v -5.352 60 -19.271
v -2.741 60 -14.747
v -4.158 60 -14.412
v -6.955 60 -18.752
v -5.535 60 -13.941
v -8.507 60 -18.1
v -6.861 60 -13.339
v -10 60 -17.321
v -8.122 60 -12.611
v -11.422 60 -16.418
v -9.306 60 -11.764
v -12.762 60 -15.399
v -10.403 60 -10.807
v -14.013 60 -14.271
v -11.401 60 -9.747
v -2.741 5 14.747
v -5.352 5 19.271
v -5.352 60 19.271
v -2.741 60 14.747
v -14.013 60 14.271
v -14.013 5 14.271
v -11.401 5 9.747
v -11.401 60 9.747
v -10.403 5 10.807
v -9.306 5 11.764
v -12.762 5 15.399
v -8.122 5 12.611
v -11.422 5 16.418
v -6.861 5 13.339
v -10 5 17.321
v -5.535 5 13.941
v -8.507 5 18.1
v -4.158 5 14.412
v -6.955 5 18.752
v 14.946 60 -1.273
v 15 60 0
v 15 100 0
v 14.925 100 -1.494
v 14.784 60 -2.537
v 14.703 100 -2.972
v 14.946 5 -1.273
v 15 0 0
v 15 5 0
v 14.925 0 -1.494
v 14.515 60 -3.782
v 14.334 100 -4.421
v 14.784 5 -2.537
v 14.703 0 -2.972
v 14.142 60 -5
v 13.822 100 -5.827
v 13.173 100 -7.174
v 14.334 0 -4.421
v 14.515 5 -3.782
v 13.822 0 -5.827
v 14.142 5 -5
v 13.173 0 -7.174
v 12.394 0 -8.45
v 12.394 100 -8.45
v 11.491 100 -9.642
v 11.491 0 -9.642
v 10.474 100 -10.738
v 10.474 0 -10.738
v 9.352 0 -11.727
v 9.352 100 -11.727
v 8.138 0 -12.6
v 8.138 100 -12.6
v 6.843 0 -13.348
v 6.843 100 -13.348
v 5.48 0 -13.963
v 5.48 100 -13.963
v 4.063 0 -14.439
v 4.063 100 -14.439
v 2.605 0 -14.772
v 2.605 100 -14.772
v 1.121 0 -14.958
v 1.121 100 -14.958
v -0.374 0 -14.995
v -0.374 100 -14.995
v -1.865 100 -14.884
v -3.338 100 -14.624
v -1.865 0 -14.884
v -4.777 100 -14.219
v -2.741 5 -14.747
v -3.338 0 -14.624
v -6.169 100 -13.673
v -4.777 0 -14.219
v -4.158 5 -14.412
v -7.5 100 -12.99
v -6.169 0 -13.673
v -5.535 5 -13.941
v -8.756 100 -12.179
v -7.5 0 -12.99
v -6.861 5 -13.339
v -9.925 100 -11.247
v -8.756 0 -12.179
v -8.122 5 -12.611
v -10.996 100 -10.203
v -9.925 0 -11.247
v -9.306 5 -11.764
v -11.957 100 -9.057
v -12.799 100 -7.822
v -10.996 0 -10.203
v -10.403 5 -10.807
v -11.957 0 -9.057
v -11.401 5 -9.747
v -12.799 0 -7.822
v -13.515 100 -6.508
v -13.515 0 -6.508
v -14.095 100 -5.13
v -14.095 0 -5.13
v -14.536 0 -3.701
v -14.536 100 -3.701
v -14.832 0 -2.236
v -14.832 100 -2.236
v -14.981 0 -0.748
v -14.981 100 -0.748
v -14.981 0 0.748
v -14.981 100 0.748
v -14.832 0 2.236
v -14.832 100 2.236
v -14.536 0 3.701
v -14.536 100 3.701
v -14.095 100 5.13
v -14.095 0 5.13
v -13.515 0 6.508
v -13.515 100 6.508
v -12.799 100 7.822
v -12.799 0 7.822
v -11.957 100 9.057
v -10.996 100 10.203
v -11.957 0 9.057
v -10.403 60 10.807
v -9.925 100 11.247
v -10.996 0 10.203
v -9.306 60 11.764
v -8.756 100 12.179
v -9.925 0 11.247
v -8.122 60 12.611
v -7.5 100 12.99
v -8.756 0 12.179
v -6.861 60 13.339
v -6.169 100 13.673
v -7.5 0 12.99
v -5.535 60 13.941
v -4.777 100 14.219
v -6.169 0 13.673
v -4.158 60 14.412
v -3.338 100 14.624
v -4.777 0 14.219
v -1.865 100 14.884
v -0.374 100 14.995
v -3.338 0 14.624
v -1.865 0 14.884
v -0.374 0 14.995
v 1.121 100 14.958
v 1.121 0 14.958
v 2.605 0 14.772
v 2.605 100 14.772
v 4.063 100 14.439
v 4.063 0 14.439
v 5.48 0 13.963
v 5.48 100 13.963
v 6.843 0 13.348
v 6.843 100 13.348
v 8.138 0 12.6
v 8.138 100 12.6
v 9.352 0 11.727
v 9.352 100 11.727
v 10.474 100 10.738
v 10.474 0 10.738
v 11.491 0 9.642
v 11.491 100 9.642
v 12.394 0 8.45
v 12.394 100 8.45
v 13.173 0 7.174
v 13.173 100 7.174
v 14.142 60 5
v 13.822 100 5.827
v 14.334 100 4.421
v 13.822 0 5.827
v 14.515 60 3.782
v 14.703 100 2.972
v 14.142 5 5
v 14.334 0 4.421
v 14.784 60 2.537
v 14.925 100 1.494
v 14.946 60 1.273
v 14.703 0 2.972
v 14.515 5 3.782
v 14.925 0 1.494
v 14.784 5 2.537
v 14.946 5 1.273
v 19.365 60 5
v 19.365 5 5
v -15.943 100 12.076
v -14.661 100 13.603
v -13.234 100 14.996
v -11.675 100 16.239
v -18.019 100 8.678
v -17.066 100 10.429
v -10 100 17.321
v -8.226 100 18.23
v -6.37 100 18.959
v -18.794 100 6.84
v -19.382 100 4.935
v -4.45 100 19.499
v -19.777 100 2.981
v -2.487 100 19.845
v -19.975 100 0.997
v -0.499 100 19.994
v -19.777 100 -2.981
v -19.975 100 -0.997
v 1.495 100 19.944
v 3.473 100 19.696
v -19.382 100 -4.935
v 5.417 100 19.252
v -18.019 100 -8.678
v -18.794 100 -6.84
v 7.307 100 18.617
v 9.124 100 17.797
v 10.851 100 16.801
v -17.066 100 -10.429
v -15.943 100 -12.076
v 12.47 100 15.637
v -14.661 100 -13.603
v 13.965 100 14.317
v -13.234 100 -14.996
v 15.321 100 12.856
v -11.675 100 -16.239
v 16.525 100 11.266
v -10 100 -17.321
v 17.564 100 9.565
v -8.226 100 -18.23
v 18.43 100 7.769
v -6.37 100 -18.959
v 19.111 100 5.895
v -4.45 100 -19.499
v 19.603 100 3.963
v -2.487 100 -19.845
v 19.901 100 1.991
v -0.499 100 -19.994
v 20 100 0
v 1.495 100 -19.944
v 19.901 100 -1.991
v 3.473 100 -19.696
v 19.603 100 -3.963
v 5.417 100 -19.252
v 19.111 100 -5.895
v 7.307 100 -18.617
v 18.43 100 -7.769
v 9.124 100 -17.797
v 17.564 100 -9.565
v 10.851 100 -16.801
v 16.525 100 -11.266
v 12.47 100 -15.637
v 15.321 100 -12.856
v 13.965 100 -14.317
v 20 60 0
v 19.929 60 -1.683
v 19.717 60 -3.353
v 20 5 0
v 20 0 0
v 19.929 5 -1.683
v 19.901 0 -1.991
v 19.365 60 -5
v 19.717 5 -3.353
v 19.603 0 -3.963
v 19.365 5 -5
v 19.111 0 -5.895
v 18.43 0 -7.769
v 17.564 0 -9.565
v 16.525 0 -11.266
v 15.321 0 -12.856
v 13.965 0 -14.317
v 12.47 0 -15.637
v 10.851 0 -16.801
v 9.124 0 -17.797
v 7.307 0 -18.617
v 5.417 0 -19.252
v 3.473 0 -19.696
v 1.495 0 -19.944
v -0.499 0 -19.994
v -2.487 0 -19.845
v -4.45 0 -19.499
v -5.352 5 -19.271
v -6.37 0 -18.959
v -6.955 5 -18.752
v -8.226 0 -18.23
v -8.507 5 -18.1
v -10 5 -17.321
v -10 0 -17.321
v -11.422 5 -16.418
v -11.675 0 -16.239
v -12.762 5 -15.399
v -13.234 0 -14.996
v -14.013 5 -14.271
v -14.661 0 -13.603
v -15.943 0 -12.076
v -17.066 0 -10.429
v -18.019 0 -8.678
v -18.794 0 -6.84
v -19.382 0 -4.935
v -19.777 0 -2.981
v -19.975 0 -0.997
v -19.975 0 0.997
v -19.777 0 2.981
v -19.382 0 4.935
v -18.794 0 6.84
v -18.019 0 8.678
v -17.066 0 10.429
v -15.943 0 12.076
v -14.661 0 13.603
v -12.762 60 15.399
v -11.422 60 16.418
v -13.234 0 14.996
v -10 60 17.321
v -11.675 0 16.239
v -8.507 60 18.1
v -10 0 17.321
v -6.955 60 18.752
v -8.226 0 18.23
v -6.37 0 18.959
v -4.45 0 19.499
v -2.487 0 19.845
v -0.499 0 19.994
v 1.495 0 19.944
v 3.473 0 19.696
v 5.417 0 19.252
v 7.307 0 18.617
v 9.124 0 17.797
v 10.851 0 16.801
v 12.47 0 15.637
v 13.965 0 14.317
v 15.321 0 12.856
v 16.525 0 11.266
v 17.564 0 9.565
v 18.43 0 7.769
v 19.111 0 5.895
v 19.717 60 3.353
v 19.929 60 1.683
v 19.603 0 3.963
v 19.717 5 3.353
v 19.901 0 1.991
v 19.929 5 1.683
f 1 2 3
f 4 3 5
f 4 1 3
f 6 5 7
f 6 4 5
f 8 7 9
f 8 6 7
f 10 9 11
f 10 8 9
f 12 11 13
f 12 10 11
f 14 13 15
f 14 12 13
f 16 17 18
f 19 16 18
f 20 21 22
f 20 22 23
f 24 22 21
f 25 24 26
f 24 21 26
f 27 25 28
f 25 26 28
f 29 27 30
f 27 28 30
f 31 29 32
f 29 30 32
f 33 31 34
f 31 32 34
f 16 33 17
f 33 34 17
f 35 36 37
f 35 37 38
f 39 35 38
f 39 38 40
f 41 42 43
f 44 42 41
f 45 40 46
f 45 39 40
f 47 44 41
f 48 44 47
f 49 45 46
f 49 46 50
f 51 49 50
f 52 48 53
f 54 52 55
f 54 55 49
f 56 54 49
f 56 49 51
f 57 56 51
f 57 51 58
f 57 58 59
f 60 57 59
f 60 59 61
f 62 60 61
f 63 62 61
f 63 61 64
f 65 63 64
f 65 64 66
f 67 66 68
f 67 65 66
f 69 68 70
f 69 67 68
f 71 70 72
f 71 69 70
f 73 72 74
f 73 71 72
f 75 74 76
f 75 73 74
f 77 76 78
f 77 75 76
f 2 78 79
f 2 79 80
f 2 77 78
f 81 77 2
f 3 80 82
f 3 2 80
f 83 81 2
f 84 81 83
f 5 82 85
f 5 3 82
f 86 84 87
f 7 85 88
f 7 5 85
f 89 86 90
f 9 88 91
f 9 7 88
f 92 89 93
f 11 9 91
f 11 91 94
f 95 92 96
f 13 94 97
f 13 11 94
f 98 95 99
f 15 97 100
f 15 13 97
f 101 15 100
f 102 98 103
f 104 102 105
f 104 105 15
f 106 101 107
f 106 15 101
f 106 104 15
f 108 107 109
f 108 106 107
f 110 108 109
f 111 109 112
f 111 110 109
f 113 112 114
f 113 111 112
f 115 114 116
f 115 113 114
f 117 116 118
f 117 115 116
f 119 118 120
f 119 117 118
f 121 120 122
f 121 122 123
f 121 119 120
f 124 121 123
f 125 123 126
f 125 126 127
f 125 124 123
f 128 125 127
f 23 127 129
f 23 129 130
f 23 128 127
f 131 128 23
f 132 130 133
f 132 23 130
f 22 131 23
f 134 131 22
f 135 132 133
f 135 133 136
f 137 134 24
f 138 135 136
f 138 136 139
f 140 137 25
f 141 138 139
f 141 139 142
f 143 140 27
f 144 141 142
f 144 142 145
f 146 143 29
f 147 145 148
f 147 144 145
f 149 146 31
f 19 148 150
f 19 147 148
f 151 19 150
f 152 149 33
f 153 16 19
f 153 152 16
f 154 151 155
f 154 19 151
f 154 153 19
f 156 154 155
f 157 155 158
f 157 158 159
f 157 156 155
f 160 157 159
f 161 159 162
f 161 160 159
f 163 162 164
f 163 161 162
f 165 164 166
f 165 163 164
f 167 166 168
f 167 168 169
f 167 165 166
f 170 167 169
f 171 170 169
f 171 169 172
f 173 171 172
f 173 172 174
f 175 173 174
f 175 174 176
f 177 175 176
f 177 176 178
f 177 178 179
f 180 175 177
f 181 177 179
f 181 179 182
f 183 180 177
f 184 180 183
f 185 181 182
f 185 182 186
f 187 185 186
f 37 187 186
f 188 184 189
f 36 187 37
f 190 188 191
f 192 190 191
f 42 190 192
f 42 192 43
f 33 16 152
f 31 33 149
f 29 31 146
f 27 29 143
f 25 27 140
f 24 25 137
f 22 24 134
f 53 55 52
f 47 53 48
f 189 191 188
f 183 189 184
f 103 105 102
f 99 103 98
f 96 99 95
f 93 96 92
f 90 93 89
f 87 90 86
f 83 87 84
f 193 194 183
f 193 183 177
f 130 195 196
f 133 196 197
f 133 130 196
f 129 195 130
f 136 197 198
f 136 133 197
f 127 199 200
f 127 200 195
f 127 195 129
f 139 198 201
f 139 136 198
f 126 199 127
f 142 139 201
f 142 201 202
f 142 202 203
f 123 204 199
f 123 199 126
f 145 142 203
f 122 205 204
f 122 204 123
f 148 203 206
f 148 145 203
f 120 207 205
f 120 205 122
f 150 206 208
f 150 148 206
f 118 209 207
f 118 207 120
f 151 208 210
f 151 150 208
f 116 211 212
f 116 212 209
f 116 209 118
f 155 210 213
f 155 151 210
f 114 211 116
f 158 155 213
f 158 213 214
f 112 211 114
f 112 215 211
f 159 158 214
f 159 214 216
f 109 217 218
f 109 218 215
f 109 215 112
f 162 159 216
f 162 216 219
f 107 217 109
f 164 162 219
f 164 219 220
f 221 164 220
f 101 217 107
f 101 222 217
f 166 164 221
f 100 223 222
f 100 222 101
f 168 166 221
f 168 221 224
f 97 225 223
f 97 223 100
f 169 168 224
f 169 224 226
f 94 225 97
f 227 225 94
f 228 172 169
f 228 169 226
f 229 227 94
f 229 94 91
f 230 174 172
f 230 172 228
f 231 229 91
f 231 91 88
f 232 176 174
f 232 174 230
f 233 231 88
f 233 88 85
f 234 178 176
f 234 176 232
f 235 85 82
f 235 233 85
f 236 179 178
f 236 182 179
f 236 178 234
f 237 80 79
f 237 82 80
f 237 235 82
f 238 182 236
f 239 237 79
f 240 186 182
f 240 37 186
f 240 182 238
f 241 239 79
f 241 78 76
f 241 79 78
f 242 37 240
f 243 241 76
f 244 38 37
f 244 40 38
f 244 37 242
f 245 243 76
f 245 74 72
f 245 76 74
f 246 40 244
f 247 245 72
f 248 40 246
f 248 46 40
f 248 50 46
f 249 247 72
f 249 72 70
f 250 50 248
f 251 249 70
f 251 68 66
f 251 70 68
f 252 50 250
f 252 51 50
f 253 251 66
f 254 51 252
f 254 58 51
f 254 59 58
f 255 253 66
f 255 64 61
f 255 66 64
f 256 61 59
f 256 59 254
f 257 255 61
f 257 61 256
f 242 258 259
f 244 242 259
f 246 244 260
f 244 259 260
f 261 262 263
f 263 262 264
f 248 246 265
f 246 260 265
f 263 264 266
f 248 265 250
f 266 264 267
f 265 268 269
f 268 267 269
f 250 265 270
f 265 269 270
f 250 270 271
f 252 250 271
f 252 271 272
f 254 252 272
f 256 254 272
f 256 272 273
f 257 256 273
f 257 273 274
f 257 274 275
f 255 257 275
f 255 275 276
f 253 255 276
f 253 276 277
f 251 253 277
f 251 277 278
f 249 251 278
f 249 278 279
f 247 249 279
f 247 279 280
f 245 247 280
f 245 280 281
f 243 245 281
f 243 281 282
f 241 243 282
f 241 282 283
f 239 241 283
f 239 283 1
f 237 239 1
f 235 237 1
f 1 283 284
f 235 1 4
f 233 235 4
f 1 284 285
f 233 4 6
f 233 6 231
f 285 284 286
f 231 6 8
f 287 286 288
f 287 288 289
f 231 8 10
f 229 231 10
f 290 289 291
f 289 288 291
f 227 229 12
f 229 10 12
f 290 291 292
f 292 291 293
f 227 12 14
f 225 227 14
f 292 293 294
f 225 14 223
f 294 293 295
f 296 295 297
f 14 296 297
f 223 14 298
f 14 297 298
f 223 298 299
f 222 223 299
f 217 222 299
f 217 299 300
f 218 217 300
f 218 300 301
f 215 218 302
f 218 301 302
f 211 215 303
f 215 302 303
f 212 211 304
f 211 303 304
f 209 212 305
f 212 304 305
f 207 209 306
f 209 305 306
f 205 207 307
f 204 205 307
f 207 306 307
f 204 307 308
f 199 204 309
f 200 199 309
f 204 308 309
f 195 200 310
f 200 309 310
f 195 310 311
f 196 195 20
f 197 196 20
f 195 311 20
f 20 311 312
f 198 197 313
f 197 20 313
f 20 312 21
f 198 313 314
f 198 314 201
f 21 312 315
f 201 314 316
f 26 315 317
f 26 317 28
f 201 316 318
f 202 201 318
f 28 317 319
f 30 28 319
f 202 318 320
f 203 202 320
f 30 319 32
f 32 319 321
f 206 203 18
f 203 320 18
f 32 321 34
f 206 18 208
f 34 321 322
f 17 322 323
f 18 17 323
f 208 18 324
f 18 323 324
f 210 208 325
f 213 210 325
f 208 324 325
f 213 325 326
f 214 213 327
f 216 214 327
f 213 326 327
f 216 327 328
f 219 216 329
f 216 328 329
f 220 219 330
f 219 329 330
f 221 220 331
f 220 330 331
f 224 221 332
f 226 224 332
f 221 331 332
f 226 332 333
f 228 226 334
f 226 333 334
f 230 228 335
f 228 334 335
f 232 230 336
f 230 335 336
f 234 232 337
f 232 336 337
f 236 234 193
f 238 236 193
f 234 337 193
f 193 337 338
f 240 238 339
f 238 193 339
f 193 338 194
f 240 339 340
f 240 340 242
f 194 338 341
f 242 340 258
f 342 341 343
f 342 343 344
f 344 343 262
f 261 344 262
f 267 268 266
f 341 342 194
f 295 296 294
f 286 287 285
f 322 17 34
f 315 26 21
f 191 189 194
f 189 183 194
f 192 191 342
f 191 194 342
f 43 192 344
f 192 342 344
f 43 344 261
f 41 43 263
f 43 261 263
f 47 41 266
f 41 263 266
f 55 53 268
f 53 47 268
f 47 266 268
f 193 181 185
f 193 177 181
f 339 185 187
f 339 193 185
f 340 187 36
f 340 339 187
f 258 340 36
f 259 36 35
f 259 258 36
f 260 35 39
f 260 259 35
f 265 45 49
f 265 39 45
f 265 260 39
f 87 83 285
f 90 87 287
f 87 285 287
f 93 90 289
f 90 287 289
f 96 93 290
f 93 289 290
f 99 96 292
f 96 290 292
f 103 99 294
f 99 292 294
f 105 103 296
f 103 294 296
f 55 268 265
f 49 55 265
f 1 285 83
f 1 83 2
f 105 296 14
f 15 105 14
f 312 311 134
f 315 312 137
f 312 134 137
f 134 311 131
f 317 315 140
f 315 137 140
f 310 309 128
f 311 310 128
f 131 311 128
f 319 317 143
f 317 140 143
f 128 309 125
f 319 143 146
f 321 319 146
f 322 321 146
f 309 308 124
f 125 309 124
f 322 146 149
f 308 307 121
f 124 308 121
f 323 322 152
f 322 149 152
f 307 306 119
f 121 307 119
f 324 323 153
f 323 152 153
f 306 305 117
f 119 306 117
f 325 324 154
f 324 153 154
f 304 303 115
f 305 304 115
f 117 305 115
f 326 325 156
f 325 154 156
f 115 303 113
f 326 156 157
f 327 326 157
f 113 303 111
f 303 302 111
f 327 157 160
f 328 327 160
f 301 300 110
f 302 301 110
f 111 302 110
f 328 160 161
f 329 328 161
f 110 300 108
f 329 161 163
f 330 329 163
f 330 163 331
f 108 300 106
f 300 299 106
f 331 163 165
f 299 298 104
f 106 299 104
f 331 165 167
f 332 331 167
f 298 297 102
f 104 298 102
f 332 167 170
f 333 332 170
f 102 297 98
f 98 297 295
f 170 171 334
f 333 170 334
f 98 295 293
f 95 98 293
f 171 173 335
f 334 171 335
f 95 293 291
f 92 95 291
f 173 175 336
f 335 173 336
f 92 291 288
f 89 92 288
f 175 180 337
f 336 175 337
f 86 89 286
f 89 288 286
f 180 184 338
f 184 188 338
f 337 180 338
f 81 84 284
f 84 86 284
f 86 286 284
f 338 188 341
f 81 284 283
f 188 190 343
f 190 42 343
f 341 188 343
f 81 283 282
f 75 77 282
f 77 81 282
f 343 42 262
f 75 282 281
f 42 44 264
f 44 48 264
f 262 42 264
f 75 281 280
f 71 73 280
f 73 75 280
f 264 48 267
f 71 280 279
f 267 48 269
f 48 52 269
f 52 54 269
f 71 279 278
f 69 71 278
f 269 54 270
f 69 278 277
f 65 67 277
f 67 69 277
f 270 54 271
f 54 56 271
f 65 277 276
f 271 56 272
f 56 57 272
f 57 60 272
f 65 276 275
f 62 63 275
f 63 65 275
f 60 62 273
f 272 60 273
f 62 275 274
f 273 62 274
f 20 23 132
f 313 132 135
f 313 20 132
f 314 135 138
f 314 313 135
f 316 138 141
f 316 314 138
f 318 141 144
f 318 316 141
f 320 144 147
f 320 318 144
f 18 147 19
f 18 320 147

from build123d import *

# Parameters (mm, degrees)
SKETCH1_R           = 20
SKETCH1_R_2         = 15
BOSS_EXTRUDE1_DEPTH = 100
SKETCH2_W           = 10
SKETCH2_H           = 55
CUT_EXTRUDE2_DEPTH  = 5.857864
CIRPATTERN1_COUNT   = 3


with BuildPart() as part:
    # Sketch1 → Boss-Extrude1 (new body)
    with BuildSketch(Plane(origin=(0, 0, 0), x_dir=(1, 0, 0), z_dir=(0, 1, 0))):
        Circle(SKETCH1_R)
        Circle(SKETCH1_R_2, mode=Mode.SUBTRACT)
    extrude(amount=BOSS_EXTRUDE1_DEPTH)

    # Sketch2 → Cut-Extrude2 (cut)
    with BuildSketch(Plane(origin=(20, 0, 0), x_dir=(0, 0, -1), z_dir=(1, 0, 0))):
        with Locations((0, 32.5)):
            Rectangle(SKETCH2_W, SKETCH2_H)
    cut_extrude2 = extrude(amount=-CUT_EXTRUDE2_DEPTH, mode=Mode.SUBTRACT)

    # CirPattern1: Cut-Extrude2 ×3 about axis
    cirpattern1_axis = Axis((0, 0, 0), (0, 1, 0))
    for i in range(1, CIRPATTERN1_COUNT):
        add(cut_extrude2.rotate(cirpattern1_axis, i * 360 / CIRPATTERN1_COUNT), mode=Mode.SUBTRACT)


solid = part.part
